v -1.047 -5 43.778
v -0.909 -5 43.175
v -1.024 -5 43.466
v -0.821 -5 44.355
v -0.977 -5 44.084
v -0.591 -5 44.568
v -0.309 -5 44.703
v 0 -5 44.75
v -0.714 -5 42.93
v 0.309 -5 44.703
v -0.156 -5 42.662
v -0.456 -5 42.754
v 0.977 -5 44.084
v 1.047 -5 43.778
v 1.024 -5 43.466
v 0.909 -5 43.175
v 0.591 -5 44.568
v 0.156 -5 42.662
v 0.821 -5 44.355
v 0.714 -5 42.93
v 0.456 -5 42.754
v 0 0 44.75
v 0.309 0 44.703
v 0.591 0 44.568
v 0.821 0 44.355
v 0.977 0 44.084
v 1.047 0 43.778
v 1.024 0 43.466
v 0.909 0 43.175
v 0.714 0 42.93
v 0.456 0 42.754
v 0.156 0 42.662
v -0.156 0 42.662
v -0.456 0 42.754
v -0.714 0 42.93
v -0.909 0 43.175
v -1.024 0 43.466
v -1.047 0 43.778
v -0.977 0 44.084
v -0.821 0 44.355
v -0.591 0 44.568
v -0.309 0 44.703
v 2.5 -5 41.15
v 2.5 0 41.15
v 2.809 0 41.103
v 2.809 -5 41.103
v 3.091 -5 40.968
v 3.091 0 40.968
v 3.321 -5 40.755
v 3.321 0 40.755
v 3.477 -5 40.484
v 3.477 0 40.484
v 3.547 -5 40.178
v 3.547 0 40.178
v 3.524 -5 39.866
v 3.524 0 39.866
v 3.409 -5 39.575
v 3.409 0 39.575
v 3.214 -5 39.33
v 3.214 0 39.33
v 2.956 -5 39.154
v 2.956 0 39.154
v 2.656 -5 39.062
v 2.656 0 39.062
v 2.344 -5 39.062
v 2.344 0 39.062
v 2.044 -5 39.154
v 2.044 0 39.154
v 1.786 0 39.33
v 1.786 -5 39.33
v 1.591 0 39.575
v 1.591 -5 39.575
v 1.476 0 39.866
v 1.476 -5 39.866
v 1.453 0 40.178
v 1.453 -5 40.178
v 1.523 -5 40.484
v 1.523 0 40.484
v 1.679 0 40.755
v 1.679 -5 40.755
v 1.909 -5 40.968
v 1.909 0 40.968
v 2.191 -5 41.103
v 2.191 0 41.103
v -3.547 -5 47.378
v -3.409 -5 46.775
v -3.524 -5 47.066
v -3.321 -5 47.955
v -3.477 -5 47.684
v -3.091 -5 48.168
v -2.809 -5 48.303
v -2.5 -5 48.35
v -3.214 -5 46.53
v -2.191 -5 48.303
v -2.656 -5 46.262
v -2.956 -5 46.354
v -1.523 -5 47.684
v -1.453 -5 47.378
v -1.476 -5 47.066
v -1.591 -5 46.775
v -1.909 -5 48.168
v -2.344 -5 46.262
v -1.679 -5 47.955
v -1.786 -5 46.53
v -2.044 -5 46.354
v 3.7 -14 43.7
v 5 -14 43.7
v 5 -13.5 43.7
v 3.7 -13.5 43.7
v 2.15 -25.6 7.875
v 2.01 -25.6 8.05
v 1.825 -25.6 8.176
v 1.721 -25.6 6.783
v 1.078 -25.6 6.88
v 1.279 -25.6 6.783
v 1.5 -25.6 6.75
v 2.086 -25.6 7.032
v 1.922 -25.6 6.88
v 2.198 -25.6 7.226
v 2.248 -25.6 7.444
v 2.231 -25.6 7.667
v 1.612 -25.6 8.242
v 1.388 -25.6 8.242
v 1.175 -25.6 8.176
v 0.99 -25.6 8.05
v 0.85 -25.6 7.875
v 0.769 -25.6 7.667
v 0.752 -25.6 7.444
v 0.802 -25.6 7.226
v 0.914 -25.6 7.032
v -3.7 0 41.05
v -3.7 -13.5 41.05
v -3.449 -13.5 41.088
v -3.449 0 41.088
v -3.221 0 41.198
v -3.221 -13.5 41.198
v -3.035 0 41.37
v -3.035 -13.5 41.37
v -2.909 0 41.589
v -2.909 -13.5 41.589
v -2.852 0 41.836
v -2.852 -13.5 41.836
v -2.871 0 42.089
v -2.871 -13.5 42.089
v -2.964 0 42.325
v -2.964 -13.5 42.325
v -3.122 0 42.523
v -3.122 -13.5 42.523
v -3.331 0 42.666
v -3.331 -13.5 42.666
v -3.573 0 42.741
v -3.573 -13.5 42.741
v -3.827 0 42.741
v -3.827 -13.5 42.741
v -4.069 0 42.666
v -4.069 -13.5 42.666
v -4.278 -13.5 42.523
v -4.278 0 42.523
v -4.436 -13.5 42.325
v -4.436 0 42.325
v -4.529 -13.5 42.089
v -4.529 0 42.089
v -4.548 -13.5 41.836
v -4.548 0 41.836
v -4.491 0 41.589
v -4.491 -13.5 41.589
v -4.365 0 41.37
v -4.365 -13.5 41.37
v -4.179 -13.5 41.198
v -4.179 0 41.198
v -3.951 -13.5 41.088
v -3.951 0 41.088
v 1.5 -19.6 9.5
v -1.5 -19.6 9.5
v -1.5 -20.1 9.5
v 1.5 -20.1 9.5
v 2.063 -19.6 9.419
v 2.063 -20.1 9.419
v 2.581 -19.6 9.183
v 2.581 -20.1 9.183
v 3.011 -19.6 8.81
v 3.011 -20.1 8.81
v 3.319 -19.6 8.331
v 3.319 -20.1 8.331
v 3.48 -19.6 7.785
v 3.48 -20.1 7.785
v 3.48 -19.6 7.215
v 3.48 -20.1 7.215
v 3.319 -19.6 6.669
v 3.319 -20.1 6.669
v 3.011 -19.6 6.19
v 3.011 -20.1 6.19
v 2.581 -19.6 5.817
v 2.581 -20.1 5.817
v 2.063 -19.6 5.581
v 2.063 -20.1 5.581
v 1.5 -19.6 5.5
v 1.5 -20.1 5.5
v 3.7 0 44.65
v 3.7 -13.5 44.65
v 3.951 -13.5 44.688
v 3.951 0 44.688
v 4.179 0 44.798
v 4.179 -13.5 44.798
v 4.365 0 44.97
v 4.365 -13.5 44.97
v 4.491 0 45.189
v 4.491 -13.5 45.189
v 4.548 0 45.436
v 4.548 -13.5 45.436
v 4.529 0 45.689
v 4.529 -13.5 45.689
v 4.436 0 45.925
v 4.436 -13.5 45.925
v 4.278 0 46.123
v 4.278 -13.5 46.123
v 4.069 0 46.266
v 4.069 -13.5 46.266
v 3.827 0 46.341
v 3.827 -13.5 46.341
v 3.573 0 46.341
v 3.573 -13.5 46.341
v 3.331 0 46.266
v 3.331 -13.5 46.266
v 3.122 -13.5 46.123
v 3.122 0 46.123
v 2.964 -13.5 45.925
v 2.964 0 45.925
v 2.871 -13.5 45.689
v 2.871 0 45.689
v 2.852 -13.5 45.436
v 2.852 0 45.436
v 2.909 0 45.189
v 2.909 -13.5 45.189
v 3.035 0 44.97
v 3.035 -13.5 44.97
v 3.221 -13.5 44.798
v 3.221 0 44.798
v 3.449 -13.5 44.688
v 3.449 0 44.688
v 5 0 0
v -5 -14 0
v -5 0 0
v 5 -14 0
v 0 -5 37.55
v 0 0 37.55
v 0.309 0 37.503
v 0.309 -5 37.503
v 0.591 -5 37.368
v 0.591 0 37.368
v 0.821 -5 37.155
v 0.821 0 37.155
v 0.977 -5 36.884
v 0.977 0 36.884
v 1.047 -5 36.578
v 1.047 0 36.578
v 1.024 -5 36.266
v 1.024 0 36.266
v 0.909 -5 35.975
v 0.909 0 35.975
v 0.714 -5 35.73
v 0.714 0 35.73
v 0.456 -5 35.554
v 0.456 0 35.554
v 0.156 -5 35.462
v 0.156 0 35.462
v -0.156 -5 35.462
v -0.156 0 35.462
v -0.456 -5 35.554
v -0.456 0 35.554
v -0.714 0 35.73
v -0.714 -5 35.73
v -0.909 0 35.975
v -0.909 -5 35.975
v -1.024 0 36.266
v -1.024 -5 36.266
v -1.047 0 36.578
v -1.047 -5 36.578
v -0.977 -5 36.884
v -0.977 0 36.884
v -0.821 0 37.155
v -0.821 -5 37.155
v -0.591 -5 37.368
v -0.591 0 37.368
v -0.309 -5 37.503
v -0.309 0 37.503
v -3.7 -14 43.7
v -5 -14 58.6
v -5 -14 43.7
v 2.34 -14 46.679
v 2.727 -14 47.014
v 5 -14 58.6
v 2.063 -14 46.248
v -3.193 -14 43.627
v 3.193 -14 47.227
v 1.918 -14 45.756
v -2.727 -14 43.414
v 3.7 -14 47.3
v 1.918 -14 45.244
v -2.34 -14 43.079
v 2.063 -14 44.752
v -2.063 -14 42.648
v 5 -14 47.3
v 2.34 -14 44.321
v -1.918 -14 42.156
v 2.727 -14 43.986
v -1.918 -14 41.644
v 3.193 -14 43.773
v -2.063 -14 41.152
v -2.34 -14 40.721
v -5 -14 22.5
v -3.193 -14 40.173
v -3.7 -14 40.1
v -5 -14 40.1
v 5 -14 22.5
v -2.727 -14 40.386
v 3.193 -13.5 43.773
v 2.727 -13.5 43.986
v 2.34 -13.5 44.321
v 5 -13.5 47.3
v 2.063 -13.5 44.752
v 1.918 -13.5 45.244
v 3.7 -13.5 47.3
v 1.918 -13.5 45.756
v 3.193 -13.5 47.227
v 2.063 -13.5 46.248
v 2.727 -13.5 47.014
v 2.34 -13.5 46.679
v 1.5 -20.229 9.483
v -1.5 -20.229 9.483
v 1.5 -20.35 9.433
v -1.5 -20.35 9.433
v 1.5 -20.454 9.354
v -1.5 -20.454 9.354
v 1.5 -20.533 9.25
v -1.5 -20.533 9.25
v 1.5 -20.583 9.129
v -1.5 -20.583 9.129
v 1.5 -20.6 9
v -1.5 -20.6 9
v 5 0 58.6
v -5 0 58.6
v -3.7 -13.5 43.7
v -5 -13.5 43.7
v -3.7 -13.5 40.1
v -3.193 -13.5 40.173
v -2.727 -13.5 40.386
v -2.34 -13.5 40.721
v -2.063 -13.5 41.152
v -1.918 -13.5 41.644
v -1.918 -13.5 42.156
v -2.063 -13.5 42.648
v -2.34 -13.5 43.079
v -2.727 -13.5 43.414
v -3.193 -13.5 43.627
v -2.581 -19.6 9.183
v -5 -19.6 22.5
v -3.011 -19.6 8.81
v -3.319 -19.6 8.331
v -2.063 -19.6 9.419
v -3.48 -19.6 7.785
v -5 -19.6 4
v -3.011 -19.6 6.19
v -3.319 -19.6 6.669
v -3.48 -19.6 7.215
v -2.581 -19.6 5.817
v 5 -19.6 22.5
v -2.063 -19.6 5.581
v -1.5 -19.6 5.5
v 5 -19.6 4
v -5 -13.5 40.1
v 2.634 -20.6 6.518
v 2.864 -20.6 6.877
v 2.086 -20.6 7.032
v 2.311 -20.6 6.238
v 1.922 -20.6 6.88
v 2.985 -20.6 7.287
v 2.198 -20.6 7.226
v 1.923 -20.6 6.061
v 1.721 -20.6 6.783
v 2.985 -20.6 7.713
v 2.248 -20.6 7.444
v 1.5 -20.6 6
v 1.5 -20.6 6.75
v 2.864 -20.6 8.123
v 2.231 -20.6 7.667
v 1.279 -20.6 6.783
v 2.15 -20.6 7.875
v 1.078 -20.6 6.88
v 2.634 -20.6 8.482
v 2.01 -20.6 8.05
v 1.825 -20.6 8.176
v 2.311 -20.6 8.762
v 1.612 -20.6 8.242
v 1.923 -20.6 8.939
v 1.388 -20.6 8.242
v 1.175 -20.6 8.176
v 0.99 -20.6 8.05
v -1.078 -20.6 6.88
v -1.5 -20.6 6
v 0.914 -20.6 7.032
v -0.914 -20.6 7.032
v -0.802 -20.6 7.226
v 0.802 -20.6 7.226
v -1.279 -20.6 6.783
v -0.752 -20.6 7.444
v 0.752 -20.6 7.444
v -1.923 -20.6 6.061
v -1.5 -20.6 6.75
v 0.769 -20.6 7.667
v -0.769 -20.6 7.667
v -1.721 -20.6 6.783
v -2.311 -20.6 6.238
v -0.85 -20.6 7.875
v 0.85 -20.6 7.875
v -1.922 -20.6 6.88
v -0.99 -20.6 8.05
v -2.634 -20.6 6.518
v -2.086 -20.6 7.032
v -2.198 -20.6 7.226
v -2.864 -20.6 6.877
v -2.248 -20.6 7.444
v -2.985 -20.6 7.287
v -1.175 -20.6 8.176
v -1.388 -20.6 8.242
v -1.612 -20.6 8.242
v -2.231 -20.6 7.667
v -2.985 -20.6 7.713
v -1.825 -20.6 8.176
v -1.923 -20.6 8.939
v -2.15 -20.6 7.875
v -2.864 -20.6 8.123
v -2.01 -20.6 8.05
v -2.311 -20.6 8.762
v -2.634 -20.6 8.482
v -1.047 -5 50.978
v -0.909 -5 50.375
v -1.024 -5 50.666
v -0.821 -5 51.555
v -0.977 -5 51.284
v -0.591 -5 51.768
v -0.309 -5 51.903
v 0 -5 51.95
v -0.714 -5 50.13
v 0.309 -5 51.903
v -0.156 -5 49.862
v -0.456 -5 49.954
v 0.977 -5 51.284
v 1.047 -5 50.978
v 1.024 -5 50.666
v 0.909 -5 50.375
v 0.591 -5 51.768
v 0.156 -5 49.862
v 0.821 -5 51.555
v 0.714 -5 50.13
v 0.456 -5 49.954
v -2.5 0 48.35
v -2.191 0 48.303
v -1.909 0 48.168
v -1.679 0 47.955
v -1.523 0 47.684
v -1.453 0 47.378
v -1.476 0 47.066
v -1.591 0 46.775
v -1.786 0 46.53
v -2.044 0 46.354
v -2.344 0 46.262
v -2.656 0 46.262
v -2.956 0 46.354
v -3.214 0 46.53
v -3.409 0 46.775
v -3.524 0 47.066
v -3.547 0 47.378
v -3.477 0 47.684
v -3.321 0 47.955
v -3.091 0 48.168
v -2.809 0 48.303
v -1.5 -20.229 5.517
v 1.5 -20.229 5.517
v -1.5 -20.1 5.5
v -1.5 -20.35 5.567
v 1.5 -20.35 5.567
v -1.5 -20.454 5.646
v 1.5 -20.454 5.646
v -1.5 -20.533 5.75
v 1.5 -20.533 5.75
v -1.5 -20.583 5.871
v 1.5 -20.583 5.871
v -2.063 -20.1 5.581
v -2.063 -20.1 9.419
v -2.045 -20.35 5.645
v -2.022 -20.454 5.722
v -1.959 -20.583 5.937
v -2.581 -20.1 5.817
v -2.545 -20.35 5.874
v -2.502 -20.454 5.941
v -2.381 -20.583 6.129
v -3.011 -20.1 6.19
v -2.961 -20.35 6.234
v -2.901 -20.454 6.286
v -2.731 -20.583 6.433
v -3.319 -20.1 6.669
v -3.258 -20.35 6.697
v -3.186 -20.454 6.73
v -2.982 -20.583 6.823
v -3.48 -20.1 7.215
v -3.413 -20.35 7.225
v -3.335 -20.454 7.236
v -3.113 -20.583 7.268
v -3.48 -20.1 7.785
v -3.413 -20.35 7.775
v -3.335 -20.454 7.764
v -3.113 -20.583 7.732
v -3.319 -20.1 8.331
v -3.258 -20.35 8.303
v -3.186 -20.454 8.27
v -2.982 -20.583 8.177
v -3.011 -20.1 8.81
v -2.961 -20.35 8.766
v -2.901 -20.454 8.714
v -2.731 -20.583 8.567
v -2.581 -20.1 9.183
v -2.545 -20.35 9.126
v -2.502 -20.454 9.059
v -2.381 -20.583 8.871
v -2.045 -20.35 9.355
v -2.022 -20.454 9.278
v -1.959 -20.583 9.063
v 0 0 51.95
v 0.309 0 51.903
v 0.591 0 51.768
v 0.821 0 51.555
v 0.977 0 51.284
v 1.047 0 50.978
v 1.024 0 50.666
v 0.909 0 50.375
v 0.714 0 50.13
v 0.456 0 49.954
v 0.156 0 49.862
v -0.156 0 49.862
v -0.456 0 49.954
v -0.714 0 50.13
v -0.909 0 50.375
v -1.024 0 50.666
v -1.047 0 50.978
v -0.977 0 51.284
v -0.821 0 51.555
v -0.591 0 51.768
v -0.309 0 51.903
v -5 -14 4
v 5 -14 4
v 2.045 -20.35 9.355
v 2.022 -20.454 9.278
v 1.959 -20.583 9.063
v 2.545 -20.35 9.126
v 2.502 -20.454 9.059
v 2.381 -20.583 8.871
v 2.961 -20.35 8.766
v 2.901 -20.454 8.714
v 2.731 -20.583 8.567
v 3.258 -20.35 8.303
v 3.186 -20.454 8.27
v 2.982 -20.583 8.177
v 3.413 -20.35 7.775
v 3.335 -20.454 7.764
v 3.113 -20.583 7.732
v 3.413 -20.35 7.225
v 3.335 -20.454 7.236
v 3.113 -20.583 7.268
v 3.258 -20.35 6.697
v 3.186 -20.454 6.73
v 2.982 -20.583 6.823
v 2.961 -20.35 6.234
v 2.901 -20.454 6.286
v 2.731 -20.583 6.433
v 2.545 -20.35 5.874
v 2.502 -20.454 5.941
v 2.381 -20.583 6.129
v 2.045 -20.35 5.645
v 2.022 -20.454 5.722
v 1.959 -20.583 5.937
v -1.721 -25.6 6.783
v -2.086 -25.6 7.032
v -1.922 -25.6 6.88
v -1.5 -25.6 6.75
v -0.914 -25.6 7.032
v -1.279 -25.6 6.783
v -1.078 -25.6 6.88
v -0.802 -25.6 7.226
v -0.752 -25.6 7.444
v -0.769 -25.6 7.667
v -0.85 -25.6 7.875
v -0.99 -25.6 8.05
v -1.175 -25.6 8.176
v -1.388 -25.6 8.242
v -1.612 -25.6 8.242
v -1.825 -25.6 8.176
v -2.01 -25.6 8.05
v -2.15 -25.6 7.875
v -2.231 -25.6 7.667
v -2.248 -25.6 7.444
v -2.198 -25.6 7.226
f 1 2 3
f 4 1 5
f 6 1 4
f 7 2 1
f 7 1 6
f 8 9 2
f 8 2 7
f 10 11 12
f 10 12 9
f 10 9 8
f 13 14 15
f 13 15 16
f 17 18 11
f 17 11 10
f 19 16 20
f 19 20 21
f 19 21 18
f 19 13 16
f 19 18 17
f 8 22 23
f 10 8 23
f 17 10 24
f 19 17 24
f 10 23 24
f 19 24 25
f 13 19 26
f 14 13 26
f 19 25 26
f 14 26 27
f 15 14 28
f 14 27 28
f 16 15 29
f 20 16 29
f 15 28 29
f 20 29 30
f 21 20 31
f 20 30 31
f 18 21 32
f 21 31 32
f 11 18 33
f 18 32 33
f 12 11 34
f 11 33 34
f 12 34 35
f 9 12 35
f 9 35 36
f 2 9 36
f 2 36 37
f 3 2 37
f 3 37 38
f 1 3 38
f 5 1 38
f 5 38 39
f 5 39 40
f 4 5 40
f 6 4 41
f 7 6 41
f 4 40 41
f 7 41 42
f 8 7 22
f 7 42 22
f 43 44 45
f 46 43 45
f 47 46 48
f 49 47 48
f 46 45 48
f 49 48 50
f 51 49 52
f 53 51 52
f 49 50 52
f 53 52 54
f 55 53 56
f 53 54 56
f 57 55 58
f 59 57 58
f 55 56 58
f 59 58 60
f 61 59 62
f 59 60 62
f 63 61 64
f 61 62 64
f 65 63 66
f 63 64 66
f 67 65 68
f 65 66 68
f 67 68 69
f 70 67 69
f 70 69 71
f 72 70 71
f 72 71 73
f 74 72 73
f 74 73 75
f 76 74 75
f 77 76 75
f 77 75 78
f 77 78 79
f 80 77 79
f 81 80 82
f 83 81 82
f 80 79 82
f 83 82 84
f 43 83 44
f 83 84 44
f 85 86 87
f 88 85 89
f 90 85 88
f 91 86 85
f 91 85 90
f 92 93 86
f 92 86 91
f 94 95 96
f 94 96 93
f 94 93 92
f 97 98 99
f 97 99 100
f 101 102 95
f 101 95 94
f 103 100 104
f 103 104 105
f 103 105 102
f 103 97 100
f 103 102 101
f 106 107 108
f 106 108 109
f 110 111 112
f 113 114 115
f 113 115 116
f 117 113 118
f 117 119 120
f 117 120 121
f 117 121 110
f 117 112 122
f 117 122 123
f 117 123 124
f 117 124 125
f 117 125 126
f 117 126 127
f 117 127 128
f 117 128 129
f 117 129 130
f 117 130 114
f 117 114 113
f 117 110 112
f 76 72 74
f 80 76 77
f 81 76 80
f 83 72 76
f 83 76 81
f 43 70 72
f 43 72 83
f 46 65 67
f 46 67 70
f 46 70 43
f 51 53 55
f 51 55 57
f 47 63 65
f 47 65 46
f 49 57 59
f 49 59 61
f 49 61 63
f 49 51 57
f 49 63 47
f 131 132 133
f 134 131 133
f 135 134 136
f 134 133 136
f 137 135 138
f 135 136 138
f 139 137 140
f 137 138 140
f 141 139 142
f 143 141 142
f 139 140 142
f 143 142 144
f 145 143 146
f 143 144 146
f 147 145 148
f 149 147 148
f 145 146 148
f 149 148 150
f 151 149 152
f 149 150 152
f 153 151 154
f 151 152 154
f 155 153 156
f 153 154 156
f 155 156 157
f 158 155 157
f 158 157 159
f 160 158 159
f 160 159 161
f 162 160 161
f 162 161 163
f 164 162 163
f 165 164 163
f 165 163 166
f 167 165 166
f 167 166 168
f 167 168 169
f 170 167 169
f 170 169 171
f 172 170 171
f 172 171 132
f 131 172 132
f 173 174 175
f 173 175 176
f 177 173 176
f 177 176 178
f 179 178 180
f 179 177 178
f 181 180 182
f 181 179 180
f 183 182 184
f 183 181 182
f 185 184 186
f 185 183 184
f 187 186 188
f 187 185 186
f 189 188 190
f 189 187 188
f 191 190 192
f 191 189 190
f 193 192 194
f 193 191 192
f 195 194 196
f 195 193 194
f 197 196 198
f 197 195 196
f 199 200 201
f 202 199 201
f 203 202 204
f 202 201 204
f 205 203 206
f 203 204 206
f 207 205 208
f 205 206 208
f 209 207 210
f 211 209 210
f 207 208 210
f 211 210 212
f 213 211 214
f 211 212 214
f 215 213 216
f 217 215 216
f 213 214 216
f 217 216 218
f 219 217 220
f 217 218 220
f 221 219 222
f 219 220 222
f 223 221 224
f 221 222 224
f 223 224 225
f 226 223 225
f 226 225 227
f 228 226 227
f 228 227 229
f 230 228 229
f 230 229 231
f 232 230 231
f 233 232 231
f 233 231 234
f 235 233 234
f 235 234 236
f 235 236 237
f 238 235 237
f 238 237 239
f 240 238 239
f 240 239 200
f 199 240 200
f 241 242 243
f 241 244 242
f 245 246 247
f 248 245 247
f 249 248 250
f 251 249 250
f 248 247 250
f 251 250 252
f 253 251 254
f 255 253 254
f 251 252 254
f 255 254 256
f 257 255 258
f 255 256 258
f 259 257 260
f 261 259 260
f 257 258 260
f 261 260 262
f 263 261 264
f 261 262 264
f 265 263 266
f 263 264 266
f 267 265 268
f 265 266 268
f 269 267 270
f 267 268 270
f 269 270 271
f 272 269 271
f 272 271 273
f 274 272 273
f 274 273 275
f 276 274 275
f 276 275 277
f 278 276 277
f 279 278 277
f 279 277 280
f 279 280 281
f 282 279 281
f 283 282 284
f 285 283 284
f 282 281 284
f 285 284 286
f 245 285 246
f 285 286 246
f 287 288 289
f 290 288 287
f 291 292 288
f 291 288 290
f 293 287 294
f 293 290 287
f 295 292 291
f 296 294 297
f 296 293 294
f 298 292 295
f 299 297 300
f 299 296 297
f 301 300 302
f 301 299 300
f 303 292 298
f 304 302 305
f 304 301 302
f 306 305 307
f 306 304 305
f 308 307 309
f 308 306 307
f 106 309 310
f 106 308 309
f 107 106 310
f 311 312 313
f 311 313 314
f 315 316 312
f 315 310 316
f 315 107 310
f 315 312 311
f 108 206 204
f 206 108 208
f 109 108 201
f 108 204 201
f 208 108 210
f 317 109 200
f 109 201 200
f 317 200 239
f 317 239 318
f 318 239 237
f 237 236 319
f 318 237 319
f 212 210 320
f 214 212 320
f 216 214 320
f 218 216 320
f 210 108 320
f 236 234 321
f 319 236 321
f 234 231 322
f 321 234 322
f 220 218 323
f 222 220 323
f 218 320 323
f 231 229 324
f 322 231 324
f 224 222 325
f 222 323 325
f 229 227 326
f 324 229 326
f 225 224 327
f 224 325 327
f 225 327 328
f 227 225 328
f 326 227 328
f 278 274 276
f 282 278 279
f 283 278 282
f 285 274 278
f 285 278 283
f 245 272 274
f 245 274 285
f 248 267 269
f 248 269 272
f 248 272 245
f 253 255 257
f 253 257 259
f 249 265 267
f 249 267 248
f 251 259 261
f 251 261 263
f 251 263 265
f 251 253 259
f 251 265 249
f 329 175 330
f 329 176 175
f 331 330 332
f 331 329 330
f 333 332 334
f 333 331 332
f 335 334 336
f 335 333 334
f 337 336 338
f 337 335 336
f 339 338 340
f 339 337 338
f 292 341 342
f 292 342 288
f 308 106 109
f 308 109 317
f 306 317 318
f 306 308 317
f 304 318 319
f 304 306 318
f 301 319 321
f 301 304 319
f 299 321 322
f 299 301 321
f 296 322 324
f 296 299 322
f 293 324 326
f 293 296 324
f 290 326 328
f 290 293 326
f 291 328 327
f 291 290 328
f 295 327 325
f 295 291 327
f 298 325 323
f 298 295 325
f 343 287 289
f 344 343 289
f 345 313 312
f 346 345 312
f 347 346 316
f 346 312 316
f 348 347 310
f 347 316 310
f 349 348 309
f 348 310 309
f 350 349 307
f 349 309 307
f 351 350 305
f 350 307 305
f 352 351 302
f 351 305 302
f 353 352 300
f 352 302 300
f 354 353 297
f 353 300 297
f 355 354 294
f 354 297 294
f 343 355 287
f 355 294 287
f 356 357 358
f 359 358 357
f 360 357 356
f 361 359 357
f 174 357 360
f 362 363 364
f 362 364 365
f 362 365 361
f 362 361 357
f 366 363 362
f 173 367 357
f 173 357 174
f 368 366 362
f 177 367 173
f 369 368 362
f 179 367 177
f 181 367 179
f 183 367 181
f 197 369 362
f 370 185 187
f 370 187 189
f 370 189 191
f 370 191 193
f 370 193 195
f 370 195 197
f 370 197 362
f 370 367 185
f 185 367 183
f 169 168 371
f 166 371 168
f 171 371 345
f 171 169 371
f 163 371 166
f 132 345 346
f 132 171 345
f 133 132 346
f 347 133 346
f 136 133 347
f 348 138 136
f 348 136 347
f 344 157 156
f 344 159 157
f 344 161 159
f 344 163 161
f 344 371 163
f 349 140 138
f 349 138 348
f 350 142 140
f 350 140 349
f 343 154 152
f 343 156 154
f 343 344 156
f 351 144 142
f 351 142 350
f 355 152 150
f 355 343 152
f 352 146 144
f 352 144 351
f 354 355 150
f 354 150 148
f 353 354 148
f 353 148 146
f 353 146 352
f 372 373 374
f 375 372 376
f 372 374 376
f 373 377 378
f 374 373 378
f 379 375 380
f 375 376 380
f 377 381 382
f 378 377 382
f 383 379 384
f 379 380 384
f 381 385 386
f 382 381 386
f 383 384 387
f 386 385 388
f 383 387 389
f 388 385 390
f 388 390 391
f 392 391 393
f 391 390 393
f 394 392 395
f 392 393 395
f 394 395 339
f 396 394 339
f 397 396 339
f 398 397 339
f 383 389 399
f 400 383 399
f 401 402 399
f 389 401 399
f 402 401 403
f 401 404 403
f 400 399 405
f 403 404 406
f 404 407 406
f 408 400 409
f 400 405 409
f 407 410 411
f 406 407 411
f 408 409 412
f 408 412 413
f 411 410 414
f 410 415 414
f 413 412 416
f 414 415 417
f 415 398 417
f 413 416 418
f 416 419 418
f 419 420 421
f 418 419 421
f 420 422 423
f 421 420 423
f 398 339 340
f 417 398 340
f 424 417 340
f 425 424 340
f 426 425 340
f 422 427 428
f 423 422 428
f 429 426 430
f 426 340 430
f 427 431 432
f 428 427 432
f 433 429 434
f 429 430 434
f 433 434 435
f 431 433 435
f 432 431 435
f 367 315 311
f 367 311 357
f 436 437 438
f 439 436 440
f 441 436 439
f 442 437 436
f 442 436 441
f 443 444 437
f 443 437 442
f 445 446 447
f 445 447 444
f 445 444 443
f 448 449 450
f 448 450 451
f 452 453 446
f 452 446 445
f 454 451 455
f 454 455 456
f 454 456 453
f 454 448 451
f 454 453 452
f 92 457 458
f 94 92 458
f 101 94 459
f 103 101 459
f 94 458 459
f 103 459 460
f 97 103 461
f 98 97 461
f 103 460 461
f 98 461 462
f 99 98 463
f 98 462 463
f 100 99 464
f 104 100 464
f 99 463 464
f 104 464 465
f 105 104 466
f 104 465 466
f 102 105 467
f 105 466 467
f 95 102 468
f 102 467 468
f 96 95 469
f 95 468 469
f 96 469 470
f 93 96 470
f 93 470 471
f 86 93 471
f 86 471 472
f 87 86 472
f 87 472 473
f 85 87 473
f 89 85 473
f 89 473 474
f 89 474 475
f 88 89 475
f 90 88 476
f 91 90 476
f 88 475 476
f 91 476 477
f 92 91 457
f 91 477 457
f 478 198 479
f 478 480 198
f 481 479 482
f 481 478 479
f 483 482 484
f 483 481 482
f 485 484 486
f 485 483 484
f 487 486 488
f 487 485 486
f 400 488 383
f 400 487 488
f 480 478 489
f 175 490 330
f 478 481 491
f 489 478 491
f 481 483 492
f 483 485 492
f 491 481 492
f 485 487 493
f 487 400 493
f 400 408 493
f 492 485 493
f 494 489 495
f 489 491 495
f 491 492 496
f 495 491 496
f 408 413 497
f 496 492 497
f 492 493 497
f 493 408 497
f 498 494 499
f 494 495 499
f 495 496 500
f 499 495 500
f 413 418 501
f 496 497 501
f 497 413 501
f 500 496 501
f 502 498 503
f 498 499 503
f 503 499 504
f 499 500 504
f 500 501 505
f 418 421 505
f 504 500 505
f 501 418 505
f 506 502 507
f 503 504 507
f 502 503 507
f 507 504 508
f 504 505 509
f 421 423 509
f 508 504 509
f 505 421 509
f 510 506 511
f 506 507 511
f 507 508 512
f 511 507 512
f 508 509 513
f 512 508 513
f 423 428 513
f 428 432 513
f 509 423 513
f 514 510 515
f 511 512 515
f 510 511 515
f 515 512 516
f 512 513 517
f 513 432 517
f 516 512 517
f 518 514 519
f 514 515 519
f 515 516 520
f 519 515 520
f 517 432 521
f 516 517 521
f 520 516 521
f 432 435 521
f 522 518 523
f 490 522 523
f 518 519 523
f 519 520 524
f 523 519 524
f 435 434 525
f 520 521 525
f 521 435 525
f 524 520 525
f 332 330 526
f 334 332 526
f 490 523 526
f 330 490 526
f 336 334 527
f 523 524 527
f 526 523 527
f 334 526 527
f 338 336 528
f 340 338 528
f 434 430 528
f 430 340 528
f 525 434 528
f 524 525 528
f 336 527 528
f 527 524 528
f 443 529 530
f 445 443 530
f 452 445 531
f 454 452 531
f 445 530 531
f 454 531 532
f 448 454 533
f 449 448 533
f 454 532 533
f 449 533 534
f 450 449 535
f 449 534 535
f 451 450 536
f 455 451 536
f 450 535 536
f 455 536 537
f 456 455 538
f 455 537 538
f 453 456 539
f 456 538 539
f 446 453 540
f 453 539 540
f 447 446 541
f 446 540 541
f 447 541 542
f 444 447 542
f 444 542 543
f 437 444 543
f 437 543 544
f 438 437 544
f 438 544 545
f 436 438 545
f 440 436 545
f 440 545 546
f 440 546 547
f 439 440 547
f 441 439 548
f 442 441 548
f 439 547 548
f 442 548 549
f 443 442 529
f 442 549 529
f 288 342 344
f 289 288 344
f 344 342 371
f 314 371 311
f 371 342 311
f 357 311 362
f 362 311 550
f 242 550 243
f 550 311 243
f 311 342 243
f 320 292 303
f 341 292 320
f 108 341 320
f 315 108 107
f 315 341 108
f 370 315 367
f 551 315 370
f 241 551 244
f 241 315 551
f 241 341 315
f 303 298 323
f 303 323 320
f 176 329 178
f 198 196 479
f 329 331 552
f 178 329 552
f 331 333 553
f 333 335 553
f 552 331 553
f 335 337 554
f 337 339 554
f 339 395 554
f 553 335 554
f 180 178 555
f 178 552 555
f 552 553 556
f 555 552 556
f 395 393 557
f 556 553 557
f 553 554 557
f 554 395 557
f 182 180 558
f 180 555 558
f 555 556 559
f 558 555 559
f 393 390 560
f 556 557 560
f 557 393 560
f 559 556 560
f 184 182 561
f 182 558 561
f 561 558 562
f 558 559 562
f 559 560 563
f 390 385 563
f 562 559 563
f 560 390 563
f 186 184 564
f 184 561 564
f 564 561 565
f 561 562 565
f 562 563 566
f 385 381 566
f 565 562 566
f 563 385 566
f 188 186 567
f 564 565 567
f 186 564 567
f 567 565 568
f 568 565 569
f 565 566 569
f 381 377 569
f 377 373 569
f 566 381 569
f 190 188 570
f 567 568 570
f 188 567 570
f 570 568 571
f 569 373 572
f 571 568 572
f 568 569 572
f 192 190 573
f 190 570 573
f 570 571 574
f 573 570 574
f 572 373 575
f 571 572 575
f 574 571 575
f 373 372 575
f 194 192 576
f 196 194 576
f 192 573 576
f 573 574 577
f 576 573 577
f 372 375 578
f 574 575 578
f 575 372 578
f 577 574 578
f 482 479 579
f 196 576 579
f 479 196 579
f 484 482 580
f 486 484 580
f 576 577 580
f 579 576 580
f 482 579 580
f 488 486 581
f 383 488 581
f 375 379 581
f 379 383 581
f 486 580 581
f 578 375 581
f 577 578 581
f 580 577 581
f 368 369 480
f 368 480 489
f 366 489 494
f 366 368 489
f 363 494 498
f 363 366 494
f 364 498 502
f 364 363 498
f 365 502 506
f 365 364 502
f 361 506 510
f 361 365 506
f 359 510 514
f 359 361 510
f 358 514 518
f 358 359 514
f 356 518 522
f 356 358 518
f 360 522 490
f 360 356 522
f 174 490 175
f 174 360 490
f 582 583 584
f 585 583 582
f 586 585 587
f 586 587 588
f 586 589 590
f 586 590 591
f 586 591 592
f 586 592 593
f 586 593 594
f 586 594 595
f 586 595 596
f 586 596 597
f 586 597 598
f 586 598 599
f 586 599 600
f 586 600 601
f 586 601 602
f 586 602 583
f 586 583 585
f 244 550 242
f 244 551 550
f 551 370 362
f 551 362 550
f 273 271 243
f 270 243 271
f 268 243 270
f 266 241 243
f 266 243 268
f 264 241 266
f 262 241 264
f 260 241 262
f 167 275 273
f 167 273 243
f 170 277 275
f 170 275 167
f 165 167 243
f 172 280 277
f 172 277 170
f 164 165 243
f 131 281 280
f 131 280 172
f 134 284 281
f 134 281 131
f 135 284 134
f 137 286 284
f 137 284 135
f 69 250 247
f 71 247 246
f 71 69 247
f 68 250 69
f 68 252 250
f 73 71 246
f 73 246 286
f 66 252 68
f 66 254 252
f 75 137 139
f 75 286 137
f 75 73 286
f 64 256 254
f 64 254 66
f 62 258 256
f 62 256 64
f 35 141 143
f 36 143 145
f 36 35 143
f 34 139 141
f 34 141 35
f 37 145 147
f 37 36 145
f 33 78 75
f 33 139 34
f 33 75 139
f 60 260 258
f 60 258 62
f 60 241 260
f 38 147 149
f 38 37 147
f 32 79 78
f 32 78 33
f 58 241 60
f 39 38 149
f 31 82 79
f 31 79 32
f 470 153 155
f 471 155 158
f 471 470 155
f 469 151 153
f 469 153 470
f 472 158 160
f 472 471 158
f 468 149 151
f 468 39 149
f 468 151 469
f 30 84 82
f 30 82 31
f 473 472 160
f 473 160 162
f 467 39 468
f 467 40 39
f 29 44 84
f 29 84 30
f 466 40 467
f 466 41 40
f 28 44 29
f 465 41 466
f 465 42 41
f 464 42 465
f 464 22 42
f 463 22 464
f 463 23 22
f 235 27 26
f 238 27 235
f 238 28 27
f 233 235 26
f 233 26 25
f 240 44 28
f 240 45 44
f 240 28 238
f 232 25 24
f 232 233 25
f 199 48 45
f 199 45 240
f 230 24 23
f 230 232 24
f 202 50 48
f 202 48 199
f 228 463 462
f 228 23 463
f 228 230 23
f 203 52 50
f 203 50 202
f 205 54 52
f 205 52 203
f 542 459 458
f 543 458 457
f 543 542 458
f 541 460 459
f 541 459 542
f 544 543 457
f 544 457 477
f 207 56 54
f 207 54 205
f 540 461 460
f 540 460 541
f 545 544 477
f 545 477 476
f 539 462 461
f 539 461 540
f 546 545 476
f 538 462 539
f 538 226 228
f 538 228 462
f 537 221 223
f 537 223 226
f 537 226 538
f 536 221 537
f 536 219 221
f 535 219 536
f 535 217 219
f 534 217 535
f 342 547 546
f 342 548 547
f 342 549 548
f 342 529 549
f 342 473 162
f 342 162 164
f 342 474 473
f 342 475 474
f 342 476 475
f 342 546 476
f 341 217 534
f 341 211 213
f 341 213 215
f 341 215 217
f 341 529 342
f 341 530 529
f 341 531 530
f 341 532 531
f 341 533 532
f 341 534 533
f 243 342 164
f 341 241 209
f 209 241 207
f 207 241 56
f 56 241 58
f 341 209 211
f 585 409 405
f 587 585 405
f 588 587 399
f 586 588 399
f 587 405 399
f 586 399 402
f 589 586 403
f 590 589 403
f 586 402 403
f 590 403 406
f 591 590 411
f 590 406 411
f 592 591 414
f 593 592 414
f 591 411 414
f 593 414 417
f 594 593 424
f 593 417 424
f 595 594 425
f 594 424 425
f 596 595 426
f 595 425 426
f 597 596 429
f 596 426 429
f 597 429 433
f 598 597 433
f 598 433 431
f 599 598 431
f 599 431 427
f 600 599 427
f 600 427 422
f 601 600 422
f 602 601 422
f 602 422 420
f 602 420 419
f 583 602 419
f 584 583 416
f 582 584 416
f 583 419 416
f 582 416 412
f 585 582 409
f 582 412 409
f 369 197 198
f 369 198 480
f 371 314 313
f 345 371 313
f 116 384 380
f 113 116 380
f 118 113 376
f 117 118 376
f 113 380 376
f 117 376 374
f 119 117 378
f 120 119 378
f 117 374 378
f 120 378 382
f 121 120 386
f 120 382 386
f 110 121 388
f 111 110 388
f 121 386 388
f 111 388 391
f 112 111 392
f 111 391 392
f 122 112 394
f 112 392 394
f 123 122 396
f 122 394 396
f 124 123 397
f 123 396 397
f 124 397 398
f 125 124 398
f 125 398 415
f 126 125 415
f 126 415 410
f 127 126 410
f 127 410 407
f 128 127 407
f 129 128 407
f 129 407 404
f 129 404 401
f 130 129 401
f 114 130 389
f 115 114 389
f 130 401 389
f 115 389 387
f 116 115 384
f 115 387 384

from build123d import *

# Parameters (mm, degrees)
BODY_DEPTH                     = 5
BODY_DEPTH_BACK                = 5
SKETCH2_R                      = 0.85
F_1_7MM_THRU_SCREW_HOLES_DEPTH = 15
SCREWHEAD_RELIEF_DEPTH         = 0.5
SKETCH4_R                      = 1.05
F_1_P_PORT_DEPTH               = 5
SKETCH5_R                      = 1.05
F_2_B_PORT_DEPTH               = 5
SKETCH6_R                      = 1.05
F_3_R2_PORT_DEPTH              = 5
SKETCH7_R                      = 1.05
F_4_A_PORT_DEPTH               = 5
SKETCH8_R                      = 1.05
F_5_R1_PORT_DEPTH              = 5
EXTRUDE3_DEPTH                 = 1
FILLET1_R                      = 0.5
SKETCH10_R                     = 0.75
WIRES_2_DEPTH                  = 5


with BuildPart() as part:
    # Sketch1 → Body (new body, two sides)
    with BuildSketch(Plane(origin=(0, 0, 0), x_dir=(0, 0, -1), z_dir=(1, 0, 0))) as body_sk:
        Polygon((0, 0), (-58.6, 0), (-58.6, -14), (-22.5, -14), (-22.5, -19.6), (-4, -19.6), (-4, -14), (0, -14), align=None)
    extrude(amount=BODY_DEPTH)
    extrude(body_sk.sketch, amount=-BODY_DEPTH_BACK)

    # Sketch2 → 1.7mm Thru Screw Holes (cut, through all)
    with BuildSketch(Plane.XZ.offset(14)):
        with Locations(Location((-3.7, 41.9, 0), (0, 0, 270))):  # turned: the seam where the file's is
            Circle(SKETCH2_R)
        with Locations(Location((3.7, 45.5, 0), (0, 0, 270))):  # turned: the seam where the file's is
            Circle(SKETCH2_R)
    extrude(amount=-F_1_7MM_THRU_SCREW_HOLES_DEPTH, mode=Mode.SUBTRACT)

    # Sketch3 → Screwhead Relief (cut)
    with BuildSketch(Plane.XZ.offset(14)):
        with BuildLine():
            Line((-3.7, 43.7), (-5, 43.7))
            Line((-5, 43.7), (-5, 40.1))
            Line((-5, 40.1), (-3.7, 40.1))
            ThreePointArc((-3.7, 40.1), (-1.9, 41.9), (-3.7, 43.7))
        make_face()
        with BuildLine():
            Line((3.7, 47.3), (5, 47.3))
            Line((5, 47.3), (5, 43.7))
            Line((5, 43.7), (3.7, 43.7))
            ThreePointArc((3.7, 43.7), (1.9, 45.5), (3.7, 47.3))
        make_face()
    extrude(amount=-SCREWHEAD_RELIEF_DEPTH, mode=Mode.SUBTRACT)

    # Sketch4 → 1 P _port (cut)
    with BuildSketch(Plane(origin=(0, 0, 0), x_dir=(-1, 0, 0), z_dir=(0, 1, 0))):
        with Locations(Location((0, 43.7, 0), (0, 0, 90))):  # turned: the seam where the file's is
            Circle(SKETCH4_R)
    extrude(amount=-F_1_P_PORT_DEPTH, mode=Mode.SUBTRACT)

    # Sketch5 → 2 B _port (cut)
    with BuildSketch(Plane(origin=(0, 0, 0), x_dir=(-1, 0, 0), z_dir=(0, 1, 0))):
        with Locations(Location((2.5, 47.3, 0), (0, 0, 90))):  # turned: the seam where the file's is
            Circle(SKETCH5_R)
    extrude(amount=-F_2_B_PORT_DEPTH, mode=Mode.SUBTRACT)

    # Sketch6 → 3 R2 _port (cut)
    with BuildSketch(Plane(origin=(0, 0, 0), x_dir=(-1, 0, 0), z_dir=(0, 1, 0))):
        with Locations(Location((0, 50.9, 0), (0, 0, 90))):  # turned: the seam where the file's is
            Circle(SKETCH6_R)
    extrude(amount=-F_3_R2_PORT_DEPTH, mode=Mode.SUBTRACT)

    # Sketch7 → 4 A _port (cut)
    with BuildSketch(Plane(origin=(0, 0, 0), x_dir=(-1, 0, 0), z_dir=(0, 1, 0))):
        with Locations(Location((-2.5, 40.1, 0), (0, 0, 90))):  # turned: the seam where the file's is
            Circle(SKETCH7_R)
    extrude(amount=-F_4_A_PORT_DEPTH, mode=Mode.SUBTRACT)

    # Sketch8 → 5 R1 _port (cut)
    with BuildSketch(Plane(origin=(0, 0, 0), x_dir=(-1, 0, 0), z_dir=(0, 1, 0))):
        with Locations(Location((0, 36.5, 0), (0, 0, 90))):  # turned: the seam where the file's is
            Circle(SKETCH8_R)
    extrude(amount=-F_5_R1_PORT_DEPTH, mode=Mode.SUBTRACT)

    # Sketch9 → Extrude3 (add)
    with BuildSketch(Plane.XZ.offset(19.6)):
        with BuildLine():
            Line((-1.5, 9.5), (1.5, 9.5))
            ThreePointArc((1.5, 9.5), (3.5, 7.5), (1.5, 5.5))
            Line((1.5, 5.5), (-1.5, 5.5))
            ThreePointArc((-1.5, 5.5), (-3.5, 7.5), (-1.5, 9.5))
        make_face()
    extrude(amount=EXTRUDE3_DEPTH)

    # Fillet1
    fillet1_edges = [part.edges().sort_by_distance(p)[0] for p in [
        (-3.5, -20.6, 7.5),
        (0, -20.6, 5.5),
        (3.5, -20.6, 7.5),
        (0, -20.6, 9.5),
    ]]
    fillet(fillet1_edges, radius=FILLET1_R)

    # Sketch10 → Wires 2 (add)
    with BuildSketch(Plane.XZ.offset(20.6)):
        with Locations(Location((-1.5, 7.5, 0), (0, 0, 270))):  # turned: the seam where the file's is
            Circle(SKETCH10_R)
        with Locations(Location((1.5, 7.5, 0), (0, 0, 270))):  # turned: the seam where the file's is
            Circle(SKETCH10_R)
    extrude(amount=WIRES_2_DEPTH)


solid = part.part
